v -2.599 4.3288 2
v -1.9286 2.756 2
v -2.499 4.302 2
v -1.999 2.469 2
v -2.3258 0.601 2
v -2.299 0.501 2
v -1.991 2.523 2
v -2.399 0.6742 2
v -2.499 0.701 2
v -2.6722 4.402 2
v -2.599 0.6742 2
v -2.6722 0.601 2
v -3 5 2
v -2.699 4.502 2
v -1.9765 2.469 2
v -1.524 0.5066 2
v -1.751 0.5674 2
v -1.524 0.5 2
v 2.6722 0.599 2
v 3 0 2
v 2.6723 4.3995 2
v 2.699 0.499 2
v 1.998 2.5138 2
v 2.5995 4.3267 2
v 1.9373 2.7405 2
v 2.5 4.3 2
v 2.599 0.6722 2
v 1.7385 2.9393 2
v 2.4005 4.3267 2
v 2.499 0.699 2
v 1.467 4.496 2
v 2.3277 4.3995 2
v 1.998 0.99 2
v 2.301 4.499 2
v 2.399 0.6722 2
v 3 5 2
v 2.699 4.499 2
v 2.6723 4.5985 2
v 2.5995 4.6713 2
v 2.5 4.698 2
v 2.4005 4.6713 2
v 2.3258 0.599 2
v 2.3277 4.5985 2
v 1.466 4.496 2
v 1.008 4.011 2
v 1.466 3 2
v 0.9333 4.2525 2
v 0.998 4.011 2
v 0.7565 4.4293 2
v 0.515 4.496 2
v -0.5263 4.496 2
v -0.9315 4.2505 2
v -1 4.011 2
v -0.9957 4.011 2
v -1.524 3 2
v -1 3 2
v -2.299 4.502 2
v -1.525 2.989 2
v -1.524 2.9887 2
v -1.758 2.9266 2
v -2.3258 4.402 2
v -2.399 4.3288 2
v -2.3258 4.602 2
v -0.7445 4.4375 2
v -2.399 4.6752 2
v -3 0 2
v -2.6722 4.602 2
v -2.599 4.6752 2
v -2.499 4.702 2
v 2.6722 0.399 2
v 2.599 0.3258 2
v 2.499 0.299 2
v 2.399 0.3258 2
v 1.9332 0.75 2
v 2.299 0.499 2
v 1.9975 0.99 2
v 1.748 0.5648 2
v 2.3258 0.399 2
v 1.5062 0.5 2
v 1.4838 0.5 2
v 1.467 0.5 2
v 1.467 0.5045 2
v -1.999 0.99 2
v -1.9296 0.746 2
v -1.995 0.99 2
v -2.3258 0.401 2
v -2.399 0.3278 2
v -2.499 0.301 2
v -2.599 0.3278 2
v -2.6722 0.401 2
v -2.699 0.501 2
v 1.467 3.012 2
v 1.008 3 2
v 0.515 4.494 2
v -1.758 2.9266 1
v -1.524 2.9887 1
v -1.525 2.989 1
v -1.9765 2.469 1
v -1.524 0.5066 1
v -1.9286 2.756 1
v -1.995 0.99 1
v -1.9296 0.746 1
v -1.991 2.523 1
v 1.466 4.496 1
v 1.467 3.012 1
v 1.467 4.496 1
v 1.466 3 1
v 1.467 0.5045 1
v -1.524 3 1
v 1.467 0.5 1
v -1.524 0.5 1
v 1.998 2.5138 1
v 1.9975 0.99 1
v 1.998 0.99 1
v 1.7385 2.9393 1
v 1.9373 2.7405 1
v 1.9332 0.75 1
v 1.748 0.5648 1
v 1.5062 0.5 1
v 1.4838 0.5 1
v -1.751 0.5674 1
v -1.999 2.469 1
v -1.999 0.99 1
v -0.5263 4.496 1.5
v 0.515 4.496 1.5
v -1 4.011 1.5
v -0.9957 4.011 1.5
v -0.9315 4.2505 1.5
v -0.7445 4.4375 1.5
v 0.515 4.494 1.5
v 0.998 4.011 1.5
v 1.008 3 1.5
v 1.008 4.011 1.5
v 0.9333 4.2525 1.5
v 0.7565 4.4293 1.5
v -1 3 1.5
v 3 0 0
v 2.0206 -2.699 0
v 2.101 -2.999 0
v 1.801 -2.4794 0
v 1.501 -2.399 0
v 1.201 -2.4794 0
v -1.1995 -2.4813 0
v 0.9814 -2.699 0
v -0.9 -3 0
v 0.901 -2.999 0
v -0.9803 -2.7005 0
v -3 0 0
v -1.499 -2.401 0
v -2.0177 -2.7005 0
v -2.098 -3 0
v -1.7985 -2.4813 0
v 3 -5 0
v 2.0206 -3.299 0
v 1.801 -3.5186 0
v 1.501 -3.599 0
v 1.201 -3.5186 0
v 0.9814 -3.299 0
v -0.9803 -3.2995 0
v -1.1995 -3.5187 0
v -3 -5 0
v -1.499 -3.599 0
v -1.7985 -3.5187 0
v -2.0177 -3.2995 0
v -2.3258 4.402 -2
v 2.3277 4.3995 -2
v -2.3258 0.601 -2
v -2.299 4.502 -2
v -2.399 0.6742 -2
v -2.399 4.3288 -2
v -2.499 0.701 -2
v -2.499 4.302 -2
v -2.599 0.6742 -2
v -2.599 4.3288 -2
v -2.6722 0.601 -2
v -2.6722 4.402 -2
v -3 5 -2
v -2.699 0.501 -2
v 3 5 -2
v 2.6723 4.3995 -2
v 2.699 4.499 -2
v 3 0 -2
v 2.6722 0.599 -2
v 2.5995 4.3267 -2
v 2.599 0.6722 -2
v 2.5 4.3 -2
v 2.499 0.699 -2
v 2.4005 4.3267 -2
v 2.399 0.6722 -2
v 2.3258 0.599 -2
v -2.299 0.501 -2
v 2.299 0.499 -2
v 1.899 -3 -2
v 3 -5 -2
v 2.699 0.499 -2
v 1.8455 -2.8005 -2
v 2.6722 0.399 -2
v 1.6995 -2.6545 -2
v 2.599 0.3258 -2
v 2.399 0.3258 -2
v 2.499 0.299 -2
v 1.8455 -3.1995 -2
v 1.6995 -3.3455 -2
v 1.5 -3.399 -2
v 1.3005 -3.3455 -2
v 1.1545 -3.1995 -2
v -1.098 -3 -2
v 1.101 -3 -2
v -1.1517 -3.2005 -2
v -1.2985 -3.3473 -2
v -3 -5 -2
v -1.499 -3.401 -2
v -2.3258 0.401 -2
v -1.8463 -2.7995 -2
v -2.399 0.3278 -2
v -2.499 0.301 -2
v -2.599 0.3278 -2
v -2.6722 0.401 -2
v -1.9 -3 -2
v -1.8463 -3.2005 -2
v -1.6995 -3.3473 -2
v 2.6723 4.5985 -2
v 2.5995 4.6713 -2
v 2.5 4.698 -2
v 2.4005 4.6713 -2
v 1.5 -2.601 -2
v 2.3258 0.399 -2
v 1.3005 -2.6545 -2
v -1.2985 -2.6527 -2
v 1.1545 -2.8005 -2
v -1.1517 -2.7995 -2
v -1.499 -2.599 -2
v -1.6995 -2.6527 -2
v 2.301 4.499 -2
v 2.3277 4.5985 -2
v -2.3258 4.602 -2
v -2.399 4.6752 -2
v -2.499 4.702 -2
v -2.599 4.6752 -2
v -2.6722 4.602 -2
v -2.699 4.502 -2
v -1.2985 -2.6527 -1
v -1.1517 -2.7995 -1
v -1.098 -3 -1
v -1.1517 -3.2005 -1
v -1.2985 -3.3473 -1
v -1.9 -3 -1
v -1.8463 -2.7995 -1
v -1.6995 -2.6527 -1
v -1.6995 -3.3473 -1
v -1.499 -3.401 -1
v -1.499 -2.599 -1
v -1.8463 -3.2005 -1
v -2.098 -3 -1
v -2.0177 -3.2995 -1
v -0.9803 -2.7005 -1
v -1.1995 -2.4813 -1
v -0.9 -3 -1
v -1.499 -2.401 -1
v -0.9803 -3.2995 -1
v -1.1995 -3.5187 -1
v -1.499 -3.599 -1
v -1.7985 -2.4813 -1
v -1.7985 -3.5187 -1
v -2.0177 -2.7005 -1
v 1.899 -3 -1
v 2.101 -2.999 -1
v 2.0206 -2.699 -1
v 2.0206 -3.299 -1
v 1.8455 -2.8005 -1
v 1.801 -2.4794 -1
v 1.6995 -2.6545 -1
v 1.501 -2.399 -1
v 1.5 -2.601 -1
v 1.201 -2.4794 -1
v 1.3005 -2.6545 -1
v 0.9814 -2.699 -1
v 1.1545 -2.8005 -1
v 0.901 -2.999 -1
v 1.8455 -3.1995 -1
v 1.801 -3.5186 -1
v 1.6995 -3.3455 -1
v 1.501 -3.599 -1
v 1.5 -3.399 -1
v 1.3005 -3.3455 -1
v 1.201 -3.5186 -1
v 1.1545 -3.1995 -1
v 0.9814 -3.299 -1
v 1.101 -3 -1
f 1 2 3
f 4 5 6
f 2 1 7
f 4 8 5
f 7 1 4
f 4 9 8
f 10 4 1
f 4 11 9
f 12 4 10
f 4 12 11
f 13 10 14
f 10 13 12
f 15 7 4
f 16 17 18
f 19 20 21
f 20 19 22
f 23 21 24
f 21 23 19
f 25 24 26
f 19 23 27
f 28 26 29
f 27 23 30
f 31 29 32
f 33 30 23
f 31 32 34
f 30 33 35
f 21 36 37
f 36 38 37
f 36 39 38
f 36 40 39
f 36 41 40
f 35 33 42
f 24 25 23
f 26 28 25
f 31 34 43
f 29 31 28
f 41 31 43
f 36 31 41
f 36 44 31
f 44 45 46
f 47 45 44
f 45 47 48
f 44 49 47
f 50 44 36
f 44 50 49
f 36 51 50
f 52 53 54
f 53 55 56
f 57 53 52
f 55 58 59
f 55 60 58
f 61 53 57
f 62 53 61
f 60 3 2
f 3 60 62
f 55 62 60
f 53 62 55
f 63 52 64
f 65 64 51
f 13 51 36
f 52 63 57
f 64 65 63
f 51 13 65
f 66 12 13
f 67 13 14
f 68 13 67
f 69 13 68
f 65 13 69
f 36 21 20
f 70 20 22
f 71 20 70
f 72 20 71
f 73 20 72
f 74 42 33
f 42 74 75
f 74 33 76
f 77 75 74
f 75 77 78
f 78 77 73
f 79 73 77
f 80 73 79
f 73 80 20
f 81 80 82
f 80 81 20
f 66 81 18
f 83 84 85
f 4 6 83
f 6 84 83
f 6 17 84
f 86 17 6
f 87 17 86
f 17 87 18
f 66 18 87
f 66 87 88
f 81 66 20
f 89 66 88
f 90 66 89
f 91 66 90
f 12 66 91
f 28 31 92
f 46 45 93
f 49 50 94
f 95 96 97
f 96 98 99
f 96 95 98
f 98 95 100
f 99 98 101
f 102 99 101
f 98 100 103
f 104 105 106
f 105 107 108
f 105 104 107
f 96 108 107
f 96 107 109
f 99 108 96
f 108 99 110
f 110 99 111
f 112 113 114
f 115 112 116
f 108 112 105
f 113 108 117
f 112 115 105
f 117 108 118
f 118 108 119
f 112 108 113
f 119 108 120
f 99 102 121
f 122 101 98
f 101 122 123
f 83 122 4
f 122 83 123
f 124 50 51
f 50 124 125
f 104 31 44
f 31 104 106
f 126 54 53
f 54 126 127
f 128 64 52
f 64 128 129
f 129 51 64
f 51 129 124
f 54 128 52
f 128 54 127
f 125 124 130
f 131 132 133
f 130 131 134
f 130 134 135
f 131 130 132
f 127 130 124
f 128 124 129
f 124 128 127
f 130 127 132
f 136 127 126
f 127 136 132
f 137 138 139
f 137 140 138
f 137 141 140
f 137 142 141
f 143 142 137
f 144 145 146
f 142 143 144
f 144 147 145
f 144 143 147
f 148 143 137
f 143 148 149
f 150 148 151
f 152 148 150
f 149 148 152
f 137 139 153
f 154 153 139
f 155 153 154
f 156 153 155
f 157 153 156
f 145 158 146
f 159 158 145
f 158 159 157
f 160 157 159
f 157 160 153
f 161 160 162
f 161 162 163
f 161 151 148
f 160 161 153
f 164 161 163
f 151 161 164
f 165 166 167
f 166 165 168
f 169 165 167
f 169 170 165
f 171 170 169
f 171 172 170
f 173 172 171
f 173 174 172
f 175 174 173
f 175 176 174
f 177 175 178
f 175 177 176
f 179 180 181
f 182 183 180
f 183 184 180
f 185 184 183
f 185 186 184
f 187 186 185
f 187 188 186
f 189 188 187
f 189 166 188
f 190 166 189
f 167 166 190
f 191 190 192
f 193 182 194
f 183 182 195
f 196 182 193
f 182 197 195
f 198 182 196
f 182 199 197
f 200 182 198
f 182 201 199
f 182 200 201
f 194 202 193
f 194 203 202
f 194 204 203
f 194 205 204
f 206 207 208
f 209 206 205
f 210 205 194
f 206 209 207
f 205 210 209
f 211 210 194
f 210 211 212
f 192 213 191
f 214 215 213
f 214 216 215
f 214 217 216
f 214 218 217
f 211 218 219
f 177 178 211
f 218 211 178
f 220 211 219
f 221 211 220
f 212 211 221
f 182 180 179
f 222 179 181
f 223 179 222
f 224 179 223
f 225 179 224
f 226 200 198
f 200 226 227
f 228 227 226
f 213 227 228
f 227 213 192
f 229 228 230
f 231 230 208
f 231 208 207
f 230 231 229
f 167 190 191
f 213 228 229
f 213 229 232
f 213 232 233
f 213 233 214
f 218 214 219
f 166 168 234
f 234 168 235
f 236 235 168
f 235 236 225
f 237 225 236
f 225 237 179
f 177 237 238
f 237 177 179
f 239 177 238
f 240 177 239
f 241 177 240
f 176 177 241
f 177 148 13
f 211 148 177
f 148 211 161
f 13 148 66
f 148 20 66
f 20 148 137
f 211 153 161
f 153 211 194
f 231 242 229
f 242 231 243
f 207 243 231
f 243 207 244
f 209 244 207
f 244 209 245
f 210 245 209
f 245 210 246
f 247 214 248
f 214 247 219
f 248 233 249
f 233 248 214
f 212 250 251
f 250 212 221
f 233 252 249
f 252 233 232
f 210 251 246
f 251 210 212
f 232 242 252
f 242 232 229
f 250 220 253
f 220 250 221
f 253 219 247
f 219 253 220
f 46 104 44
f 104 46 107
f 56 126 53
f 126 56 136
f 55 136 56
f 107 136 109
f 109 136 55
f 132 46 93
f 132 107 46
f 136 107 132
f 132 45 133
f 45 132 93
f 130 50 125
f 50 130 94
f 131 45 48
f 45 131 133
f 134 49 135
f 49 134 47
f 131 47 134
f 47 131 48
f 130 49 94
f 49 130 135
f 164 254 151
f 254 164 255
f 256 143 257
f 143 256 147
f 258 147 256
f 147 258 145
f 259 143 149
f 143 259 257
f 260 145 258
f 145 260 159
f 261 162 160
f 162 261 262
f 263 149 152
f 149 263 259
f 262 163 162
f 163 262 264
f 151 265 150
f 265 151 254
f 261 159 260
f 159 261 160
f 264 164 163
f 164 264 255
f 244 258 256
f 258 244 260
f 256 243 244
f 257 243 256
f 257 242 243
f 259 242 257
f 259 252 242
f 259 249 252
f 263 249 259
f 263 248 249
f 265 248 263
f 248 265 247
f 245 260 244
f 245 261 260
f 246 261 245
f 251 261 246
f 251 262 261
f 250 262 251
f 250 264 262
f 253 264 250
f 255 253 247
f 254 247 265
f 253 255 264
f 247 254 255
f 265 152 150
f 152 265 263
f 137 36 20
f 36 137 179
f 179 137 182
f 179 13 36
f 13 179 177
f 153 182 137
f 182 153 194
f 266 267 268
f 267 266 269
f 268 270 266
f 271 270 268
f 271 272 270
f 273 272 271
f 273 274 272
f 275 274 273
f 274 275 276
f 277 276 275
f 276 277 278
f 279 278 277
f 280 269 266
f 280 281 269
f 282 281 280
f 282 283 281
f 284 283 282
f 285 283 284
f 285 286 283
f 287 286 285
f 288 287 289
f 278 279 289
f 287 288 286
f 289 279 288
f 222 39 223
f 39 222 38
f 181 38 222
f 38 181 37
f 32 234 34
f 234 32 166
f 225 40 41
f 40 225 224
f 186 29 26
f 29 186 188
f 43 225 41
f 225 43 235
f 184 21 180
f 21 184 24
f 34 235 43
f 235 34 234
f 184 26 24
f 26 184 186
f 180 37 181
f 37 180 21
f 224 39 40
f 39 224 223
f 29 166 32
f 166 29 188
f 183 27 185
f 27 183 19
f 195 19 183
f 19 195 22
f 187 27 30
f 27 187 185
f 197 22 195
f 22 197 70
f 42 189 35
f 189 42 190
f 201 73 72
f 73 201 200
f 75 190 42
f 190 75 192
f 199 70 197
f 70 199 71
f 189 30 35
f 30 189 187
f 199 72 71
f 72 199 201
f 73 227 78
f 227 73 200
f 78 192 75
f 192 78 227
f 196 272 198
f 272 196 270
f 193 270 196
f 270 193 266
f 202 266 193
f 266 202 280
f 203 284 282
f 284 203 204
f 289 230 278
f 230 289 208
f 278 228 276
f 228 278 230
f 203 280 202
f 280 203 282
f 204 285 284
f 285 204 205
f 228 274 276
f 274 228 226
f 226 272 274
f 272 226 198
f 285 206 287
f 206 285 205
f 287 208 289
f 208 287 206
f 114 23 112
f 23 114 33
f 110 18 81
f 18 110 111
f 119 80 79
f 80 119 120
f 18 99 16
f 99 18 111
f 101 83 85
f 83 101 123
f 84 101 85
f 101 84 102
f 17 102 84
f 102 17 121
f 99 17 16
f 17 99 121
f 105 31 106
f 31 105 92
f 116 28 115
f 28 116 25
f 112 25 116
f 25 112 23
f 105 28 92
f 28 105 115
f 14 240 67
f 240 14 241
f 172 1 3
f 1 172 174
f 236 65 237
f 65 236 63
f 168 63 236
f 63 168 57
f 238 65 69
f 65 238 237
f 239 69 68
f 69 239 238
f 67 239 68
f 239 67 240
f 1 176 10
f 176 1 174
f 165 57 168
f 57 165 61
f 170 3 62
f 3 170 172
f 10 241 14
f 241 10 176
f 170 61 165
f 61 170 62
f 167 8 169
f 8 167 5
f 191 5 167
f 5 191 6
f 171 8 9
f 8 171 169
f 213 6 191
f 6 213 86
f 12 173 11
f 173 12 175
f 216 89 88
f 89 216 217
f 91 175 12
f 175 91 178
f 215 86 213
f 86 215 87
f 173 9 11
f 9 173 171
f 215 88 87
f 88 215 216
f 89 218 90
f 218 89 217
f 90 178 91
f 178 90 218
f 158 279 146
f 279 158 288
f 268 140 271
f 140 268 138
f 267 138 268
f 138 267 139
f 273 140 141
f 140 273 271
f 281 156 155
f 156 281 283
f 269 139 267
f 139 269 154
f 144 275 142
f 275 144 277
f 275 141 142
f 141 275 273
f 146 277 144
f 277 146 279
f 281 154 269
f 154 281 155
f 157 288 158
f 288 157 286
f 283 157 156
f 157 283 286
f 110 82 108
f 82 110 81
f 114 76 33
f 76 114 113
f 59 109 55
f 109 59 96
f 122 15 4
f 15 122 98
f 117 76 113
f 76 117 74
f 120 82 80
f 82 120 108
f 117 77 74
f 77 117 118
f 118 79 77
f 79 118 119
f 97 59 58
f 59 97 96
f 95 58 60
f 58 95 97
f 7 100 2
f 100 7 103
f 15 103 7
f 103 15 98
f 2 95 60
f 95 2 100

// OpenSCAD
intersection() {
translate([-3.6, -6, -2.4]) cube(size = [7.2, 12, 4.8], center = false);
union() {
difference() {
translate([-1.999, 4.011, 1]) cube(size = [1.51, 0.485, 1], center = false);
translate([-0.489, 3.995, 1.5])
cylinder(h = 16.6, r1 = 0.511, r2 = 0.511, center = false, $fn = 12);
}
difference() {
union() {
difference() {
translate([-3, -5, -2]) cube(size = [2.511, 5, 2], center = false);
translate([-1.499, -3, -18.1])
cylinder(h = 18.1, r1 = 0.401, r2 = 0.401, center = false, $fn = 12);
}
difference() {
translate([-1, 3, 1]) cube(size = [2.466, 1.496, 1], center = false);
translate([0.515, 3, 1.5]) cube(size = [0.493, 1.011, 16.6], center = false);
}
}
union() {
translate([0.515, 4.011, 1.5])
cylinder(h = 0.5, r1 = 0.483, r2 = 0.483, center = false, $fn = 12);
translate([-3, 0.5, 1.5]) cube(size = [3.515, 3.996, 0.5], center = false);
translate([-1.499, -3, -1])
cylinder(h = 2, r1 = 0.599, r2 = 0.599, center = false, $fn = 12);
}
}
difference() {
union() {
translate([-1.999, 0, -2]) cube(size = [4.999, 5, 4], center = false);
translate([-0.489, -5, -2]) cube(size = [3.489, 5, 1], center = false);
translate([0.515, 4.011, 2])
cylinder(h = 16.1, r1 = 0.483, r2 = 0.483, center = false, $fn = 12);
}
union() {
translate([2.5, 4.499, -2])
cylinder(h = 20.1, r1 = 0.199, r2 = 0.199, center = false, $fn = 12);
translate([2.499, 0.499, -18.1])
cylinder(h = 20.1, r1 = 0.2, r2 = 0.2, center = false, $fn = 12);
translate([1.5, -3, -18.1])
cylinder(h = 17.1, r1 = 0.399, r2 = 0.399, center = false, $fn = 12);
translate([-1.999, 0.5, 1]) cube(size = [3.997, 3.996, 17.1], center = false);
}
}
difference() {
translate([-1.999, 0, 1]) cube(size = [0.475, 0.99, 1], center = false);
translate([-1.507, 0.99, 1])
cylinder(h = 17.1, r1 = 0.488, r2 = 0.488, center = false, $fn = 12);
}
difference() {
translate([1.467, 2.469, 0]) cube(size = [0.531, 2.531, 2], center = false);
translate([1.467, 2.469, 1])
cylinder(h = 1, r1 = 0.543, r2 = 0.543, center = false, $fn = 12);
}
difference() {
translate([-3, 3, -2]) cube(size = [2, 2, 4], center = false);
translate([-2.499, 4.502, -2])
cylinder(h = 4, r1 = 0.2, r2 = 0.2, center = false, $fn = 12);
}
difference() {
translate([-3, 0, -2]) cube(size = [1.001, 4.011, 4], center = false);
translate([-2.499, 0.501, -2])
cylinder(h = 4, r1 = 0.2, r2 = 0.2, center = false, $fn = 12);
}
difference() {
translate([-0.489, -5, -2]) cube(size = [3.489, 5, 2], center = false);
translate([1.501, -2.999, -18.1])
cylinder(h = 19.6, r1 = 0.6, r2 = 0.6, center = false, $fn = 12);
}
difference() {
union() {
translate([1.467, 0, 1]) cube(size = [0.531, 0.99, 1], center = false);
translate([-1.999, 2.469, -2]) cube(size = [0.475, 1.542, 4], center = false);
}
union() {
translate([1.495, 1.003, 0])
cylinder(h = 2, r1 = 0.506, r2 = 0.506, center = false, $fn = 12);
translate([-1.525, 2.523, 1])
cylinder(h = 17.1, r1 = 0.466, r2 = 0.466, center = false, $fn = 12);
}
}
}
}
